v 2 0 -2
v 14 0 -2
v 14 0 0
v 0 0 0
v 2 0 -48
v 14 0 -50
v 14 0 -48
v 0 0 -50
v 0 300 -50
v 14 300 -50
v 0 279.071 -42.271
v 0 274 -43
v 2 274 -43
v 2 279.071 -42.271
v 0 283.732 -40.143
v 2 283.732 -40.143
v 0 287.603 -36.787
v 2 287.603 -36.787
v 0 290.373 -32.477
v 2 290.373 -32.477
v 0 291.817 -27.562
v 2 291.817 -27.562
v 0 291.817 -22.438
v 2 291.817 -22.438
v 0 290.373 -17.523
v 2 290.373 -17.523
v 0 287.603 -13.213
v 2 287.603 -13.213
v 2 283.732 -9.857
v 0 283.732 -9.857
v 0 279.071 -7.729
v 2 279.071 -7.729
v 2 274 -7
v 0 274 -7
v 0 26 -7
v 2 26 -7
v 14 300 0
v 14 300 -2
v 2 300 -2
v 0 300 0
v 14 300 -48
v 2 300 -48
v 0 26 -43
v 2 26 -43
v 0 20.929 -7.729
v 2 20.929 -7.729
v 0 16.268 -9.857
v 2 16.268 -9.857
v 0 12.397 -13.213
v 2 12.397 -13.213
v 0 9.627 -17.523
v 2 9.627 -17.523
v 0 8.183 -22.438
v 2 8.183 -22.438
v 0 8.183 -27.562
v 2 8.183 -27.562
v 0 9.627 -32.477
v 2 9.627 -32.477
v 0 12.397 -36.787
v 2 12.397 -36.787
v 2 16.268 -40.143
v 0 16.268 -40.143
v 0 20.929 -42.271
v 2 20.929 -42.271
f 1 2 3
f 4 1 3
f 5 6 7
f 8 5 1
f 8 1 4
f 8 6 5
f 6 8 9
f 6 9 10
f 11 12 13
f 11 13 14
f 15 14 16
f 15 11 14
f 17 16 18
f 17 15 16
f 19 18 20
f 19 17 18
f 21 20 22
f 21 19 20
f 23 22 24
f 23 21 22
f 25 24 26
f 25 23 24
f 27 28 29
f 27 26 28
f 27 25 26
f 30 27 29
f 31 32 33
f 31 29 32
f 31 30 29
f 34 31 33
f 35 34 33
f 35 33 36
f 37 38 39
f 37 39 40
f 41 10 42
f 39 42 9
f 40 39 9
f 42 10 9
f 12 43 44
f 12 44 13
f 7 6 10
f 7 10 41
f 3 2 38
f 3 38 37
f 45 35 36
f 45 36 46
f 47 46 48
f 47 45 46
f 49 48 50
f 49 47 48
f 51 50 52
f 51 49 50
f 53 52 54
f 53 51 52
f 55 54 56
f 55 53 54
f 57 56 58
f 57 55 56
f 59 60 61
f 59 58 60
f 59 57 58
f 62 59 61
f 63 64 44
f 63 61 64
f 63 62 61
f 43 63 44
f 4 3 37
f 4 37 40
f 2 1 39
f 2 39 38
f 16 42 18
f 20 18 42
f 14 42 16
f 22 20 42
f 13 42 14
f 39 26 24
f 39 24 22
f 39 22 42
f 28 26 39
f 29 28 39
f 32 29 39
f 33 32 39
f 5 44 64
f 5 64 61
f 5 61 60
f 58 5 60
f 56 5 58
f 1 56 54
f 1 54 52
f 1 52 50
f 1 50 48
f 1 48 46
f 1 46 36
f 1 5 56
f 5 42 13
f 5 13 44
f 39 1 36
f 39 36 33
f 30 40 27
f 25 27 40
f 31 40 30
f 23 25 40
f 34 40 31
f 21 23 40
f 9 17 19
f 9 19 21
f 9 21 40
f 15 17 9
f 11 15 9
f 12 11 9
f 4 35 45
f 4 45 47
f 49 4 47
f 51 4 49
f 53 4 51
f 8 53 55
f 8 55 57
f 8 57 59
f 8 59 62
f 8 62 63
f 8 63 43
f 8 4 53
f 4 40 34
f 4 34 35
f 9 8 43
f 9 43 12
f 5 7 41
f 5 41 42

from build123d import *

# Parameters (mm, degrees)
EXTRUDE_1_DEPTH     = 300
CUT_EXTRUDE_1_DEPTH = 305.46017802


with BuildPart() as part:
    # 草图1 → 凸台-拉伸1 (new body)
    with BuildSketch(Plane(origin=(0, 0, 0), x_dir=(1, 0, 0), z_dir=(0, 1, 0))):
        Polygon((0, 0), (0, 50), (14, 50), (14, 48), (2, 48), (2, 2), (14, 2), (14, 0), align=None)
    extrude(amount=EXTRUDE_1_DEPTH)

    # 草图2 → 切除-拉伸1 (cut, through all)
    with BuildSketch(Plane.ZY):
        with BuildLine():
            Line((-7, 274), (-7, 26))
            ThreePointArc((-7, 26), (-25, 8), (-43, 26))
            Line((-43, 26), (-43, 274))
            ThreePointArc((-43, 274), (-25, 292), (-7, 274))
        make_face()
    extrude(amount=-CUT_EXTRUDE_1_DEPTH, mode=Mode.SUBTRACT)


solid = part.part
